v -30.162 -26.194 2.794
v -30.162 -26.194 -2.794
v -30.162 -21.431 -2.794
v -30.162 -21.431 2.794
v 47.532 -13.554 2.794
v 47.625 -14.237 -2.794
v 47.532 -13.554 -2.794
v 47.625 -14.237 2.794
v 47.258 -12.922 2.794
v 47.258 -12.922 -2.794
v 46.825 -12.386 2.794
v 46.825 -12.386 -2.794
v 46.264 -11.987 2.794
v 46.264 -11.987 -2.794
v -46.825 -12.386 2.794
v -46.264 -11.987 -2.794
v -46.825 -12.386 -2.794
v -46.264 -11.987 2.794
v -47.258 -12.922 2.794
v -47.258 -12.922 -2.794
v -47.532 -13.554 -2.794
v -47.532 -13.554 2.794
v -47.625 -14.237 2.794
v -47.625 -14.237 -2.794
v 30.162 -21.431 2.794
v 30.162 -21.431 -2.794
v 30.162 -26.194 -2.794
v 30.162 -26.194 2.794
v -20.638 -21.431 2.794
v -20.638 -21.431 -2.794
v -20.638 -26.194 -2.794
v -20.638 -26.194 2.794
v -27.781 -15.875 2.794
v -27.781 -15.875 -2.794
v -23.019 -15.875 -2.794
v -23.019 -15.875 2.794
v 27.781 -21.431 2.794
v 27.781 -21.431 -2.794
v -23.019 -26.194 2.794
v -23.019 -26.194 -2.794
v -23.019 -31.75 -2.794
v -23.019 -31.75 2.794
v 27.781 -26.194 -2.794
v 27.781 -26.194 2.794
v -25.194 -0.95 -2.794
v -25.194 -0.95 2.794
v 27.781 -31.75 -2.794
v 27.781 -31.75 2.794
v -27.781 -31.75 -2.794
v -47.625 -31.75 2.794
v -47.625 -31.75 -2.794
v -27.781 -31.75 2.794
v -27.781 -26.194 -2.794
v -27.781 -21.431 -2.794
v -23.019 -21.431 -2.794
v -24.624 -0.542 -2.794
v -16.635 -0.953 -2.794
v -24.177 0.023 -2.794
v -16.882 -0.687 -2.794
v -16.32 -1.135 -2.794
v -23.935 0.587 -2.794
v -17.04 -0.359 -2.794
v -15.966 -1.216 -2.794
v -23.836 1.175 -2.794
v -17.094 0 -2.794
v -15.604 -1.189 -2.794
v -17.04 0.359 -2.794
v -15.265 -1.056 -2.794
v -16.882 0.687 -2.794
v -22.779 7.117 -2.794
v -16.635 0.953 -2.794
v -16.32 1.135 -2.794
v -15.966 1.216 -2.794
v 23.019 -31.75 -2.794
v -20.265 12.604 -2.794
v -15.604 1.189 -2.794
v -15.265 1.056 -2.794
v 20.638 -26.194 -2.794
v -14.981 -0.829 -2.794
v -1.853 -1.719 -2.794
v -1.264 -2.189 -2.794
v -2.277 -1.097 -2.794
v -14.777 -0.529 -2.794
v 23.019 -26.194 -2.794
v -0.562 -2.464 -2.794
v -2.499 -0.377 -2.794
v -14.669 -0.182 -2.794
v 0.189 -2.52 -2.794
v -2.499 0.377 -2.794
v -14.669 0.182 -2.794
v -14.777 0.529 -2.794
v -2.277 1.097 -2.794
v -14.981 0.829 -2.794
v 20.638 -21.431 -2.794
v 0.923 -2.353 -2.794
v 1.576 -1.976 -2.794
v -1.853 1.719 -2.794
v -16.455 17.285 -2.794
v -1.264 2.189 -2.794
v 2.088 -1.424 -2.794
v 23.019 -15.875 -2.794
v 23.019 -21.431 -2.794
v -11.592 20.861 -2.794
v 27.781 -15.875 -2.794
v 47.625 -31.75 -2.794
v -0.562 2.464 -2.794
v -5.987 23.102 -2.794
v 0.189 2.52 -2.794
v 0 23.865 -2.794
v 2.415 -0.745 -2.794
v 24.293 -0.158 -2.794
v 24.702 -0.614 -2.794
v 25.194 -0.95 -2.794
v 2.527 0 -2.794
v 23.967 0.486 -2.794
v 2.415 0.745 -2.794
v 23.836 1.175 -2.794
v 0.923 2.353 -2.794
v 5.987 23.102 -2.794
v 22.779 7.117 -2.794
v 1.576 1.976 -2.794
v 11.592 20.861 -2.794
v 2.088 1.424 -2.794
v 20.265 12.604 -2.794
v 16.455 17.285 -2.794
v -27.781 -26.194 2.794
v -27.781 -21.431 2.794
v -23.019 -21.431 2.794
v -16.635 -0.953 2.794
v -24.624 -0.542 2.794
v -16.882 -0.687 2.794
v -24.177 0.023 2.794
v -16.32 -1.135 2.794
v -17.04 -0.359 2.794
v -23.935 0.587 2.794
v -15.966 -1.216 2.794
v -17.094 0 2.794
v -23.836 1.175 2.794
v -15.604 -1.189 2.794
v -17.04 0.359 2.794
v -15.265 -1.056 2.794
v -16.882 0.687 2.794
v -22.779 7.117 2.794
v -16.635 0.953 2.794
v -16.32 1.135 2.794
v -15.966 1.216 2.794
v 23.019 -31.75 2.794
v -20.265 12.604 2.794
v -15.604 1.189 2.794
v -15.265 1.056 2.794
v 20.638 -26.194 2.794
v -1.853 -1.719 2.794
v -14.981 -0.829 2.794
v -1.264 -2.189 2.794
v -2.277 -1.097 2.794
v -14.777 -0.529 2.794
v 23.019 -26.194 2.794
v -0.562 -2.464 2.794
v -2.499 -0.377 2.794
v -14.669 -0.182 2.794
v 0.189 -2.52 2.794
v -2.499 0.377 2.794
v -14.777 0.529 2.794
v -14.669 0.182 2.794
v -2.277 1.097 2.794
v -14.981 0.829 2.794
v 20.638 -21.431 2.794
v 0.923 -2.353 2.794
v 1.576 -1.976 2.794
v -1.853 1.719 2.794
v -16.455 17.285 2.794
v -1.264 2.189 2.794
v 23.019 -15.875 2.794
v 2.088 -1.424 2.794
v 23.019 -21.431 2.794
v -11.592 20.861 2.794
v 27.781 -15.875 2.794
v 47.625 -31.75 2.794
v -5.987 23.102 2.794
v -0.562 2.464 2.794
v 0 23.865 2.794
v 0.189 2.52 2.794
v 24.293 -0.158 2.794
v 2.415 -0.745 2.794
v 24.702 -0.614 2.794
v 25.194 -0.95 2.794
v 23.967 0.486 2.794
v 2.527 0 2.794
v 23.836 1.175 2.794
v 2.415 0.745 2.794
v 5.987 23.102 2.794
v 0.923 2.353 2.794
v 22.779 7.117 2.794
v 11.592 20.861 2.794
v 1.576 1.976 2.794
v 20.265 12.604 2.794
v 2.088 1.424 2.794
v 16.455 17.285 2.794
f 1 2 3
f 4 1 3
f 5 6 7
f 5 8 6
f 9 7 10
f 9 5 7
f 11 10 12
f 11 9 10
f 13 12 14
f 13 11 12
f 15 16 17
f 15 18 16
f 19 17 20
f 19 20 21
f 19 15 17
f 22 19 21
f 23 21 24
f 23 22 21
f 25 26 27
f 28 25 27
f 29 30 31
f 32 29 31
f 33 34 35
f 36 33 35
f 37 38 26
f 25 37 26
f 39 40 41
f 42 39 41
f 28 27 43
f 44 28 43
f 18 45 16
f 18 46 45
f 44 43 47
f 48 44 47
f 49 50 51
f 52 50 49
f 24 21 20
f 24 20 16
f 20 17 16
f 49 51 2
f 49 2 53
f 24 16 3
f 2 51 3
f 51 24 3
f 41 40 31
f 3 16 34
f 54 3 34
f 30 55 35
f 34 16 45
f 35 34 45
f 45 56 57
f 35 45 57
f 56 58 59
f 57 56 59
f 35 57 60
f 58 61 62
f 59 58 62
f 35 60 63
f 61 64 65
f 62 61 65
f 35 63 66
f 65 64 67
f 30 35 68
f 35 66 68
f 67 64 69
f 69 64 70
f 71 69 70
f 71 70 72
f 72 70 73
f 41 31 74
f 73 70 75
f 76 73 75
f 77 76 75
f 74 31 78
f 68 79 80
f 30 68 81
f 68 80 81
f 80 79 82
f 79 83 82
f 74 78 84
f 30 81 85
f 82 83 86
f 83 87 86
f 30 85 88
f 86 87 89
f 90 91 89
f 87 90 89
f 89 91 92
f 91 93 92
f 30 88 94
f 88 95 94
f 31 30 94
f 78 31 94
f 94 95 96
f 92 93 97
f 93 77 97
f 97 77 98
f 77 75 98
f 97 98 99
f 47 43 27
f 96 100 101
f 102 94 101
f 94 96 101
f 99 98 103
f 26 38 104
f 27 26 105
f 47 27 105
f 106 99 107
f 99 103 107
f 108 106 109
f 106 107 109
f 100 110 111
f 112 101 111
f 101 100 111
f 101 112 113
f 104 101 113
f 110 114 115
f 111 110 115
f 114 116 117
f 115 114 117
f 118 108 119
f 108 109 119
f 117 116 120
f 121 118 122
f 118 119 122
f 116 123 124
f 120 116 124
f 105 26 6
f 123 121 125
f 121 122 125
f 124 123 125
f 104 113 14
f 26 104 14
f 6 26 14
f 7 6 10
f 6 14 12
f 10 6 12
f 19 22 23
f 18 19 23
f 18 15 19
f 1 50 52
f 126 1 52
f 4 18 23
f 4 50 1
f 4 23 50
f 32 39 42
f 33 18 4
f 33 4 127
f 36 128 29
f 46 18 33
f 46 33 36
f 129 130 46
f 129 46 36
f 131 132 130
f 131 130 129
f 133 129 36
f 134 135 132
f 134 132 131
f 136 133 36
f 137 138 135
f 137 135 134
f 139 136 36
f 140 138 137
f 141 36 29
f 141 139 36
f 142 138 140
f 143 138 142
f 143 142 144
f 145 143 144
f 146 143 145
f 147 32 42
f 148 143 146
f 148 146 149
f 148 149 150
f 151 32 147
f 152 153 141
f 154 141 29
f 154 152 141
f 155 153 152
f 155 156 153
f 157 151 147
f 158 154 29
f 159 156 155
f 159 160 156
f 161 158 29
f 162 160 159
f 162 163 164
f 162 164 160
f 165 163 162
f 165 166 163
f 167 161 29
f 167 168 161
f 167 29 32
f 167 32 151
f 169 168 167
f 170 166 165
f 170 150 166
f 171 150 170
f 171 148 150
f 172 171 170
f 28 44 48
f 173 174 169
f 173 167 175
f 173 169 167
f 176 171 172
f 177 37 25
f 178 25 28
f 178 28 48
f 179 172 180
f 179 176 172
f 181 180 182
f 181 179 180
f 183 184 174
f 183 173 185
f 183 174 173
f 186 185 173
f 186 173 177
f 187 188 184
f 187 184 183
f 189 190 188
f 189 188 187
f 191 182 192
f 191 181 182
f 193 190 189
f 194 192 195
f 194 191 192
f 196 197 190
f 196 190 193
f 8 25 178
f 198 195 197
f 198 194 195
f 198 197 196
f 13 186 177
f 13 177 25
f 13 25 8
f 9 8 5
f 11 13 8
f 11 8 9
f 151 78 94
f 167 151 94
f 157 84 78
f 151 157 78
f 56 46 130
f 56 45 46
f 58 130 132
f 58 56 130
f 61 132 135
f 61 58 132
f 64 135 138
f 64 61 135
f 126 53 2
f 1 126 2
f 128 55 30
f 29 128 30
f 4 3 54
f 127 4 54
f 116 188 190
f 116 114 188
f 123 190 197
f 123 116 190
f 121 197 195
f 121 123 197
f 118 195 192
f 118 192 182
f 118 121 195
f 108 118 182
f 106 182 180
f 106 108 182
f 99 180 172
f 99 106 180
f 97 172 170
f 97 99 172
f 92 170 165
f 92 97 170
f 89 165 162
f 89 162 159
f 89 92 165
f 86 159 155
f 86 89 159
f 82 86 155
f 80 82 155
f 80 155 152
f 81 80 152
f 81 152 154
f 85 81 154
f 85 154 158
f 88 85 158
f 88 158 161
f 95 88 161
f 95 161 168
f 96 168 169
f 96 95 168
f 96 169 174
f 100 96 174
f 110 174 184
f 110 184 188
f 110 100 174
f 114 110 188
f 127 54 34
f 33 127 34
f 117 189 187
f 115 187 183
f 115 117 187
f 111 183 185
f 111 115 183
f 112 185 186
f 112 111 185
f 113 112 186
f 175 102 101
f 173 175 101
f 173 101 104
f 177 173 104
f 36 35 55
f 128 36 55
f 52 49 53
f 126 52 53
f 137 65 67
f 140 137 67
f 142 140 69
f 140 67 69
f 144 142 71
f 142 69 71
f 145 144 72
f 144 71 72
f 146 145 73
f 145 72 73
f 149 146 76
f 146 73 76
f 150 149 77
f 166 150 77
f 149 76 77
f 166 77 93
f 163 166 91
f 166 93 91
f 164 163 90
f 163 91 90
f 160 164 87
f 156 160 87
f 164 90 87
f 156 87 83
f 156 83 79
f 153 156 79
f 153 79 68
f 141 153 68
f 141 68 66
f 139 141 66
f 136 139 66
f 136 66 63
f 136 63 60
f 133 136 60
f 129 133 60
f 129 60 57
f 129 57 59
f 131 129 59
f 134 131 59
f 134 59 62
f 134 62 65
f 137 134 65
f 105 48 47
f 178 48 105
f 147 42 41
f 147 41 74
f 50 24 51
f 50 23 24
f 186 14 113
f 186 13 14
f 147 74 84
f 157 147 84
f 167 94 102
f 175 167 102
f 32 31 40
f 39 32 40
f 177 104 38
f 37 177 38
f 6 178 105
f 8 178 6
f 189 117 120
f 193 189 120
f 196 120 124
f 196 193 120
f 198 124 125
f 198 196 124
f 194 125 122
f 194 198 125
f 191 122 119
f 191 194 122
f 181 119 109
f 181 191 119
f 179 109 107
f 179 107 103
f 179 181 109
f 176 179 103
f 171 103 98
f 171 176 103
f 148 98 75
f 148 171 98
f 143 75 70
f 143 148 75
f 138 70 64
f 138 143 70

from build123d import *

# Parameters (mm, degrees)
SKETCH1_R               = 2.5273
BOSS_EXTRUDE1_DEPTH     = 2.794
F_2_CLEARANCE_HOLE1_D   = 2.4384
FILLET1_R               = 2.54
CUT_EXTRUDE2_DEPTH      = 58.306278691
CUT_EXTRUDE2_DEPTH_BACK = 58.306278691


with BuildPart() as part:
    # Sketch1 → Boss-Extrude1 (new, symmetric)
    with BuildSketch(Plane.XY):
        with BuildLine():
            Line((-23.865093494, -0.254), (-47.625, -12.7))
            Line((-47.625, -12.7), (-47.625, -31.75))
            Line((-47.625, -31.75), (47.625, -31.75))
            Line((47.625, -31.75), (47.625, -12.7))
            Line((47.625, -12.7), (23.865093494, -0.254))
            Line((23.865093494, -0.254), (23.865093494, 0))
            ThreePointArc((23.865093494, 0), (0, 23.865093494), (-23.865093494, 0))
            Line((-23.865093494, 0), (-23.865093494, -0.254))
        make_face()
        Circle(SKETCH1_R, mode=Mode.SUBTRACT)
    extrude(amount=BOSS_EXTRUDE1_DEPTH, both=True)

    # #2 Clearance Hole1 (through all)
    with Locations(Plane.XY.offset(2.794)):
        with Locations((-15.875, 0)):
            Hole(F_2_CLEARANCE_HOLE1_D / 2)

    # Fillet1
    fillet1_edges = [part.edges().sort_by_distance(p)[0] for p in [
        (47.625, -12.7, 0),
        (23.865093494, -0.254, 0),
        (-47.625, -12.7, 0),
        (-23.865093494, -0.254, 0),
    ]]
    fillet(fillet1_edges, radius=FILLET1_R)

    # Sketch6 → Cut-Extrude2 (cut, two sides: drawn at the far end of the back side and taken through both)
    with BuildSketch(Plane.XY.offset(-CUT_EXTRUDE2_DEPTH_BACK)):
        Polygon((-27.78125, -31.75), (-27.78125, -26.19375), (-30.1625, -26.19375), (-30.1625, -21.43125), (-27.78125, -21.43125), (-27.78125, -15.875), (-23.01875, -15.875), (-23.01875, -21.43125), (-20.6375, -21.43125), (-20.6375, -26.19375), (-23.01875, -26.19375), (-23.01875, -31.75), align=None)
        Polygon((23.01875, -31.75), (23.01875, -26.19375), (20.6375, -26.19375), (20.6375, -21.43125), (23.01875, -21.43125), (23.01875, -15.875), (27.78125, -15.875), (27.78125, -21.43125), (30.1625, -21.43125), (30.1625, -26.19375), (27.78125, -26.19375), (27.78125, -31.75), align=None)
    extrude(amount=CUT_EXTRUDE2_DEPTH + CUT_EXTRUDE2_DEPTH_BACK, mode=Mode.SUBTRACT)


solid = part.part
